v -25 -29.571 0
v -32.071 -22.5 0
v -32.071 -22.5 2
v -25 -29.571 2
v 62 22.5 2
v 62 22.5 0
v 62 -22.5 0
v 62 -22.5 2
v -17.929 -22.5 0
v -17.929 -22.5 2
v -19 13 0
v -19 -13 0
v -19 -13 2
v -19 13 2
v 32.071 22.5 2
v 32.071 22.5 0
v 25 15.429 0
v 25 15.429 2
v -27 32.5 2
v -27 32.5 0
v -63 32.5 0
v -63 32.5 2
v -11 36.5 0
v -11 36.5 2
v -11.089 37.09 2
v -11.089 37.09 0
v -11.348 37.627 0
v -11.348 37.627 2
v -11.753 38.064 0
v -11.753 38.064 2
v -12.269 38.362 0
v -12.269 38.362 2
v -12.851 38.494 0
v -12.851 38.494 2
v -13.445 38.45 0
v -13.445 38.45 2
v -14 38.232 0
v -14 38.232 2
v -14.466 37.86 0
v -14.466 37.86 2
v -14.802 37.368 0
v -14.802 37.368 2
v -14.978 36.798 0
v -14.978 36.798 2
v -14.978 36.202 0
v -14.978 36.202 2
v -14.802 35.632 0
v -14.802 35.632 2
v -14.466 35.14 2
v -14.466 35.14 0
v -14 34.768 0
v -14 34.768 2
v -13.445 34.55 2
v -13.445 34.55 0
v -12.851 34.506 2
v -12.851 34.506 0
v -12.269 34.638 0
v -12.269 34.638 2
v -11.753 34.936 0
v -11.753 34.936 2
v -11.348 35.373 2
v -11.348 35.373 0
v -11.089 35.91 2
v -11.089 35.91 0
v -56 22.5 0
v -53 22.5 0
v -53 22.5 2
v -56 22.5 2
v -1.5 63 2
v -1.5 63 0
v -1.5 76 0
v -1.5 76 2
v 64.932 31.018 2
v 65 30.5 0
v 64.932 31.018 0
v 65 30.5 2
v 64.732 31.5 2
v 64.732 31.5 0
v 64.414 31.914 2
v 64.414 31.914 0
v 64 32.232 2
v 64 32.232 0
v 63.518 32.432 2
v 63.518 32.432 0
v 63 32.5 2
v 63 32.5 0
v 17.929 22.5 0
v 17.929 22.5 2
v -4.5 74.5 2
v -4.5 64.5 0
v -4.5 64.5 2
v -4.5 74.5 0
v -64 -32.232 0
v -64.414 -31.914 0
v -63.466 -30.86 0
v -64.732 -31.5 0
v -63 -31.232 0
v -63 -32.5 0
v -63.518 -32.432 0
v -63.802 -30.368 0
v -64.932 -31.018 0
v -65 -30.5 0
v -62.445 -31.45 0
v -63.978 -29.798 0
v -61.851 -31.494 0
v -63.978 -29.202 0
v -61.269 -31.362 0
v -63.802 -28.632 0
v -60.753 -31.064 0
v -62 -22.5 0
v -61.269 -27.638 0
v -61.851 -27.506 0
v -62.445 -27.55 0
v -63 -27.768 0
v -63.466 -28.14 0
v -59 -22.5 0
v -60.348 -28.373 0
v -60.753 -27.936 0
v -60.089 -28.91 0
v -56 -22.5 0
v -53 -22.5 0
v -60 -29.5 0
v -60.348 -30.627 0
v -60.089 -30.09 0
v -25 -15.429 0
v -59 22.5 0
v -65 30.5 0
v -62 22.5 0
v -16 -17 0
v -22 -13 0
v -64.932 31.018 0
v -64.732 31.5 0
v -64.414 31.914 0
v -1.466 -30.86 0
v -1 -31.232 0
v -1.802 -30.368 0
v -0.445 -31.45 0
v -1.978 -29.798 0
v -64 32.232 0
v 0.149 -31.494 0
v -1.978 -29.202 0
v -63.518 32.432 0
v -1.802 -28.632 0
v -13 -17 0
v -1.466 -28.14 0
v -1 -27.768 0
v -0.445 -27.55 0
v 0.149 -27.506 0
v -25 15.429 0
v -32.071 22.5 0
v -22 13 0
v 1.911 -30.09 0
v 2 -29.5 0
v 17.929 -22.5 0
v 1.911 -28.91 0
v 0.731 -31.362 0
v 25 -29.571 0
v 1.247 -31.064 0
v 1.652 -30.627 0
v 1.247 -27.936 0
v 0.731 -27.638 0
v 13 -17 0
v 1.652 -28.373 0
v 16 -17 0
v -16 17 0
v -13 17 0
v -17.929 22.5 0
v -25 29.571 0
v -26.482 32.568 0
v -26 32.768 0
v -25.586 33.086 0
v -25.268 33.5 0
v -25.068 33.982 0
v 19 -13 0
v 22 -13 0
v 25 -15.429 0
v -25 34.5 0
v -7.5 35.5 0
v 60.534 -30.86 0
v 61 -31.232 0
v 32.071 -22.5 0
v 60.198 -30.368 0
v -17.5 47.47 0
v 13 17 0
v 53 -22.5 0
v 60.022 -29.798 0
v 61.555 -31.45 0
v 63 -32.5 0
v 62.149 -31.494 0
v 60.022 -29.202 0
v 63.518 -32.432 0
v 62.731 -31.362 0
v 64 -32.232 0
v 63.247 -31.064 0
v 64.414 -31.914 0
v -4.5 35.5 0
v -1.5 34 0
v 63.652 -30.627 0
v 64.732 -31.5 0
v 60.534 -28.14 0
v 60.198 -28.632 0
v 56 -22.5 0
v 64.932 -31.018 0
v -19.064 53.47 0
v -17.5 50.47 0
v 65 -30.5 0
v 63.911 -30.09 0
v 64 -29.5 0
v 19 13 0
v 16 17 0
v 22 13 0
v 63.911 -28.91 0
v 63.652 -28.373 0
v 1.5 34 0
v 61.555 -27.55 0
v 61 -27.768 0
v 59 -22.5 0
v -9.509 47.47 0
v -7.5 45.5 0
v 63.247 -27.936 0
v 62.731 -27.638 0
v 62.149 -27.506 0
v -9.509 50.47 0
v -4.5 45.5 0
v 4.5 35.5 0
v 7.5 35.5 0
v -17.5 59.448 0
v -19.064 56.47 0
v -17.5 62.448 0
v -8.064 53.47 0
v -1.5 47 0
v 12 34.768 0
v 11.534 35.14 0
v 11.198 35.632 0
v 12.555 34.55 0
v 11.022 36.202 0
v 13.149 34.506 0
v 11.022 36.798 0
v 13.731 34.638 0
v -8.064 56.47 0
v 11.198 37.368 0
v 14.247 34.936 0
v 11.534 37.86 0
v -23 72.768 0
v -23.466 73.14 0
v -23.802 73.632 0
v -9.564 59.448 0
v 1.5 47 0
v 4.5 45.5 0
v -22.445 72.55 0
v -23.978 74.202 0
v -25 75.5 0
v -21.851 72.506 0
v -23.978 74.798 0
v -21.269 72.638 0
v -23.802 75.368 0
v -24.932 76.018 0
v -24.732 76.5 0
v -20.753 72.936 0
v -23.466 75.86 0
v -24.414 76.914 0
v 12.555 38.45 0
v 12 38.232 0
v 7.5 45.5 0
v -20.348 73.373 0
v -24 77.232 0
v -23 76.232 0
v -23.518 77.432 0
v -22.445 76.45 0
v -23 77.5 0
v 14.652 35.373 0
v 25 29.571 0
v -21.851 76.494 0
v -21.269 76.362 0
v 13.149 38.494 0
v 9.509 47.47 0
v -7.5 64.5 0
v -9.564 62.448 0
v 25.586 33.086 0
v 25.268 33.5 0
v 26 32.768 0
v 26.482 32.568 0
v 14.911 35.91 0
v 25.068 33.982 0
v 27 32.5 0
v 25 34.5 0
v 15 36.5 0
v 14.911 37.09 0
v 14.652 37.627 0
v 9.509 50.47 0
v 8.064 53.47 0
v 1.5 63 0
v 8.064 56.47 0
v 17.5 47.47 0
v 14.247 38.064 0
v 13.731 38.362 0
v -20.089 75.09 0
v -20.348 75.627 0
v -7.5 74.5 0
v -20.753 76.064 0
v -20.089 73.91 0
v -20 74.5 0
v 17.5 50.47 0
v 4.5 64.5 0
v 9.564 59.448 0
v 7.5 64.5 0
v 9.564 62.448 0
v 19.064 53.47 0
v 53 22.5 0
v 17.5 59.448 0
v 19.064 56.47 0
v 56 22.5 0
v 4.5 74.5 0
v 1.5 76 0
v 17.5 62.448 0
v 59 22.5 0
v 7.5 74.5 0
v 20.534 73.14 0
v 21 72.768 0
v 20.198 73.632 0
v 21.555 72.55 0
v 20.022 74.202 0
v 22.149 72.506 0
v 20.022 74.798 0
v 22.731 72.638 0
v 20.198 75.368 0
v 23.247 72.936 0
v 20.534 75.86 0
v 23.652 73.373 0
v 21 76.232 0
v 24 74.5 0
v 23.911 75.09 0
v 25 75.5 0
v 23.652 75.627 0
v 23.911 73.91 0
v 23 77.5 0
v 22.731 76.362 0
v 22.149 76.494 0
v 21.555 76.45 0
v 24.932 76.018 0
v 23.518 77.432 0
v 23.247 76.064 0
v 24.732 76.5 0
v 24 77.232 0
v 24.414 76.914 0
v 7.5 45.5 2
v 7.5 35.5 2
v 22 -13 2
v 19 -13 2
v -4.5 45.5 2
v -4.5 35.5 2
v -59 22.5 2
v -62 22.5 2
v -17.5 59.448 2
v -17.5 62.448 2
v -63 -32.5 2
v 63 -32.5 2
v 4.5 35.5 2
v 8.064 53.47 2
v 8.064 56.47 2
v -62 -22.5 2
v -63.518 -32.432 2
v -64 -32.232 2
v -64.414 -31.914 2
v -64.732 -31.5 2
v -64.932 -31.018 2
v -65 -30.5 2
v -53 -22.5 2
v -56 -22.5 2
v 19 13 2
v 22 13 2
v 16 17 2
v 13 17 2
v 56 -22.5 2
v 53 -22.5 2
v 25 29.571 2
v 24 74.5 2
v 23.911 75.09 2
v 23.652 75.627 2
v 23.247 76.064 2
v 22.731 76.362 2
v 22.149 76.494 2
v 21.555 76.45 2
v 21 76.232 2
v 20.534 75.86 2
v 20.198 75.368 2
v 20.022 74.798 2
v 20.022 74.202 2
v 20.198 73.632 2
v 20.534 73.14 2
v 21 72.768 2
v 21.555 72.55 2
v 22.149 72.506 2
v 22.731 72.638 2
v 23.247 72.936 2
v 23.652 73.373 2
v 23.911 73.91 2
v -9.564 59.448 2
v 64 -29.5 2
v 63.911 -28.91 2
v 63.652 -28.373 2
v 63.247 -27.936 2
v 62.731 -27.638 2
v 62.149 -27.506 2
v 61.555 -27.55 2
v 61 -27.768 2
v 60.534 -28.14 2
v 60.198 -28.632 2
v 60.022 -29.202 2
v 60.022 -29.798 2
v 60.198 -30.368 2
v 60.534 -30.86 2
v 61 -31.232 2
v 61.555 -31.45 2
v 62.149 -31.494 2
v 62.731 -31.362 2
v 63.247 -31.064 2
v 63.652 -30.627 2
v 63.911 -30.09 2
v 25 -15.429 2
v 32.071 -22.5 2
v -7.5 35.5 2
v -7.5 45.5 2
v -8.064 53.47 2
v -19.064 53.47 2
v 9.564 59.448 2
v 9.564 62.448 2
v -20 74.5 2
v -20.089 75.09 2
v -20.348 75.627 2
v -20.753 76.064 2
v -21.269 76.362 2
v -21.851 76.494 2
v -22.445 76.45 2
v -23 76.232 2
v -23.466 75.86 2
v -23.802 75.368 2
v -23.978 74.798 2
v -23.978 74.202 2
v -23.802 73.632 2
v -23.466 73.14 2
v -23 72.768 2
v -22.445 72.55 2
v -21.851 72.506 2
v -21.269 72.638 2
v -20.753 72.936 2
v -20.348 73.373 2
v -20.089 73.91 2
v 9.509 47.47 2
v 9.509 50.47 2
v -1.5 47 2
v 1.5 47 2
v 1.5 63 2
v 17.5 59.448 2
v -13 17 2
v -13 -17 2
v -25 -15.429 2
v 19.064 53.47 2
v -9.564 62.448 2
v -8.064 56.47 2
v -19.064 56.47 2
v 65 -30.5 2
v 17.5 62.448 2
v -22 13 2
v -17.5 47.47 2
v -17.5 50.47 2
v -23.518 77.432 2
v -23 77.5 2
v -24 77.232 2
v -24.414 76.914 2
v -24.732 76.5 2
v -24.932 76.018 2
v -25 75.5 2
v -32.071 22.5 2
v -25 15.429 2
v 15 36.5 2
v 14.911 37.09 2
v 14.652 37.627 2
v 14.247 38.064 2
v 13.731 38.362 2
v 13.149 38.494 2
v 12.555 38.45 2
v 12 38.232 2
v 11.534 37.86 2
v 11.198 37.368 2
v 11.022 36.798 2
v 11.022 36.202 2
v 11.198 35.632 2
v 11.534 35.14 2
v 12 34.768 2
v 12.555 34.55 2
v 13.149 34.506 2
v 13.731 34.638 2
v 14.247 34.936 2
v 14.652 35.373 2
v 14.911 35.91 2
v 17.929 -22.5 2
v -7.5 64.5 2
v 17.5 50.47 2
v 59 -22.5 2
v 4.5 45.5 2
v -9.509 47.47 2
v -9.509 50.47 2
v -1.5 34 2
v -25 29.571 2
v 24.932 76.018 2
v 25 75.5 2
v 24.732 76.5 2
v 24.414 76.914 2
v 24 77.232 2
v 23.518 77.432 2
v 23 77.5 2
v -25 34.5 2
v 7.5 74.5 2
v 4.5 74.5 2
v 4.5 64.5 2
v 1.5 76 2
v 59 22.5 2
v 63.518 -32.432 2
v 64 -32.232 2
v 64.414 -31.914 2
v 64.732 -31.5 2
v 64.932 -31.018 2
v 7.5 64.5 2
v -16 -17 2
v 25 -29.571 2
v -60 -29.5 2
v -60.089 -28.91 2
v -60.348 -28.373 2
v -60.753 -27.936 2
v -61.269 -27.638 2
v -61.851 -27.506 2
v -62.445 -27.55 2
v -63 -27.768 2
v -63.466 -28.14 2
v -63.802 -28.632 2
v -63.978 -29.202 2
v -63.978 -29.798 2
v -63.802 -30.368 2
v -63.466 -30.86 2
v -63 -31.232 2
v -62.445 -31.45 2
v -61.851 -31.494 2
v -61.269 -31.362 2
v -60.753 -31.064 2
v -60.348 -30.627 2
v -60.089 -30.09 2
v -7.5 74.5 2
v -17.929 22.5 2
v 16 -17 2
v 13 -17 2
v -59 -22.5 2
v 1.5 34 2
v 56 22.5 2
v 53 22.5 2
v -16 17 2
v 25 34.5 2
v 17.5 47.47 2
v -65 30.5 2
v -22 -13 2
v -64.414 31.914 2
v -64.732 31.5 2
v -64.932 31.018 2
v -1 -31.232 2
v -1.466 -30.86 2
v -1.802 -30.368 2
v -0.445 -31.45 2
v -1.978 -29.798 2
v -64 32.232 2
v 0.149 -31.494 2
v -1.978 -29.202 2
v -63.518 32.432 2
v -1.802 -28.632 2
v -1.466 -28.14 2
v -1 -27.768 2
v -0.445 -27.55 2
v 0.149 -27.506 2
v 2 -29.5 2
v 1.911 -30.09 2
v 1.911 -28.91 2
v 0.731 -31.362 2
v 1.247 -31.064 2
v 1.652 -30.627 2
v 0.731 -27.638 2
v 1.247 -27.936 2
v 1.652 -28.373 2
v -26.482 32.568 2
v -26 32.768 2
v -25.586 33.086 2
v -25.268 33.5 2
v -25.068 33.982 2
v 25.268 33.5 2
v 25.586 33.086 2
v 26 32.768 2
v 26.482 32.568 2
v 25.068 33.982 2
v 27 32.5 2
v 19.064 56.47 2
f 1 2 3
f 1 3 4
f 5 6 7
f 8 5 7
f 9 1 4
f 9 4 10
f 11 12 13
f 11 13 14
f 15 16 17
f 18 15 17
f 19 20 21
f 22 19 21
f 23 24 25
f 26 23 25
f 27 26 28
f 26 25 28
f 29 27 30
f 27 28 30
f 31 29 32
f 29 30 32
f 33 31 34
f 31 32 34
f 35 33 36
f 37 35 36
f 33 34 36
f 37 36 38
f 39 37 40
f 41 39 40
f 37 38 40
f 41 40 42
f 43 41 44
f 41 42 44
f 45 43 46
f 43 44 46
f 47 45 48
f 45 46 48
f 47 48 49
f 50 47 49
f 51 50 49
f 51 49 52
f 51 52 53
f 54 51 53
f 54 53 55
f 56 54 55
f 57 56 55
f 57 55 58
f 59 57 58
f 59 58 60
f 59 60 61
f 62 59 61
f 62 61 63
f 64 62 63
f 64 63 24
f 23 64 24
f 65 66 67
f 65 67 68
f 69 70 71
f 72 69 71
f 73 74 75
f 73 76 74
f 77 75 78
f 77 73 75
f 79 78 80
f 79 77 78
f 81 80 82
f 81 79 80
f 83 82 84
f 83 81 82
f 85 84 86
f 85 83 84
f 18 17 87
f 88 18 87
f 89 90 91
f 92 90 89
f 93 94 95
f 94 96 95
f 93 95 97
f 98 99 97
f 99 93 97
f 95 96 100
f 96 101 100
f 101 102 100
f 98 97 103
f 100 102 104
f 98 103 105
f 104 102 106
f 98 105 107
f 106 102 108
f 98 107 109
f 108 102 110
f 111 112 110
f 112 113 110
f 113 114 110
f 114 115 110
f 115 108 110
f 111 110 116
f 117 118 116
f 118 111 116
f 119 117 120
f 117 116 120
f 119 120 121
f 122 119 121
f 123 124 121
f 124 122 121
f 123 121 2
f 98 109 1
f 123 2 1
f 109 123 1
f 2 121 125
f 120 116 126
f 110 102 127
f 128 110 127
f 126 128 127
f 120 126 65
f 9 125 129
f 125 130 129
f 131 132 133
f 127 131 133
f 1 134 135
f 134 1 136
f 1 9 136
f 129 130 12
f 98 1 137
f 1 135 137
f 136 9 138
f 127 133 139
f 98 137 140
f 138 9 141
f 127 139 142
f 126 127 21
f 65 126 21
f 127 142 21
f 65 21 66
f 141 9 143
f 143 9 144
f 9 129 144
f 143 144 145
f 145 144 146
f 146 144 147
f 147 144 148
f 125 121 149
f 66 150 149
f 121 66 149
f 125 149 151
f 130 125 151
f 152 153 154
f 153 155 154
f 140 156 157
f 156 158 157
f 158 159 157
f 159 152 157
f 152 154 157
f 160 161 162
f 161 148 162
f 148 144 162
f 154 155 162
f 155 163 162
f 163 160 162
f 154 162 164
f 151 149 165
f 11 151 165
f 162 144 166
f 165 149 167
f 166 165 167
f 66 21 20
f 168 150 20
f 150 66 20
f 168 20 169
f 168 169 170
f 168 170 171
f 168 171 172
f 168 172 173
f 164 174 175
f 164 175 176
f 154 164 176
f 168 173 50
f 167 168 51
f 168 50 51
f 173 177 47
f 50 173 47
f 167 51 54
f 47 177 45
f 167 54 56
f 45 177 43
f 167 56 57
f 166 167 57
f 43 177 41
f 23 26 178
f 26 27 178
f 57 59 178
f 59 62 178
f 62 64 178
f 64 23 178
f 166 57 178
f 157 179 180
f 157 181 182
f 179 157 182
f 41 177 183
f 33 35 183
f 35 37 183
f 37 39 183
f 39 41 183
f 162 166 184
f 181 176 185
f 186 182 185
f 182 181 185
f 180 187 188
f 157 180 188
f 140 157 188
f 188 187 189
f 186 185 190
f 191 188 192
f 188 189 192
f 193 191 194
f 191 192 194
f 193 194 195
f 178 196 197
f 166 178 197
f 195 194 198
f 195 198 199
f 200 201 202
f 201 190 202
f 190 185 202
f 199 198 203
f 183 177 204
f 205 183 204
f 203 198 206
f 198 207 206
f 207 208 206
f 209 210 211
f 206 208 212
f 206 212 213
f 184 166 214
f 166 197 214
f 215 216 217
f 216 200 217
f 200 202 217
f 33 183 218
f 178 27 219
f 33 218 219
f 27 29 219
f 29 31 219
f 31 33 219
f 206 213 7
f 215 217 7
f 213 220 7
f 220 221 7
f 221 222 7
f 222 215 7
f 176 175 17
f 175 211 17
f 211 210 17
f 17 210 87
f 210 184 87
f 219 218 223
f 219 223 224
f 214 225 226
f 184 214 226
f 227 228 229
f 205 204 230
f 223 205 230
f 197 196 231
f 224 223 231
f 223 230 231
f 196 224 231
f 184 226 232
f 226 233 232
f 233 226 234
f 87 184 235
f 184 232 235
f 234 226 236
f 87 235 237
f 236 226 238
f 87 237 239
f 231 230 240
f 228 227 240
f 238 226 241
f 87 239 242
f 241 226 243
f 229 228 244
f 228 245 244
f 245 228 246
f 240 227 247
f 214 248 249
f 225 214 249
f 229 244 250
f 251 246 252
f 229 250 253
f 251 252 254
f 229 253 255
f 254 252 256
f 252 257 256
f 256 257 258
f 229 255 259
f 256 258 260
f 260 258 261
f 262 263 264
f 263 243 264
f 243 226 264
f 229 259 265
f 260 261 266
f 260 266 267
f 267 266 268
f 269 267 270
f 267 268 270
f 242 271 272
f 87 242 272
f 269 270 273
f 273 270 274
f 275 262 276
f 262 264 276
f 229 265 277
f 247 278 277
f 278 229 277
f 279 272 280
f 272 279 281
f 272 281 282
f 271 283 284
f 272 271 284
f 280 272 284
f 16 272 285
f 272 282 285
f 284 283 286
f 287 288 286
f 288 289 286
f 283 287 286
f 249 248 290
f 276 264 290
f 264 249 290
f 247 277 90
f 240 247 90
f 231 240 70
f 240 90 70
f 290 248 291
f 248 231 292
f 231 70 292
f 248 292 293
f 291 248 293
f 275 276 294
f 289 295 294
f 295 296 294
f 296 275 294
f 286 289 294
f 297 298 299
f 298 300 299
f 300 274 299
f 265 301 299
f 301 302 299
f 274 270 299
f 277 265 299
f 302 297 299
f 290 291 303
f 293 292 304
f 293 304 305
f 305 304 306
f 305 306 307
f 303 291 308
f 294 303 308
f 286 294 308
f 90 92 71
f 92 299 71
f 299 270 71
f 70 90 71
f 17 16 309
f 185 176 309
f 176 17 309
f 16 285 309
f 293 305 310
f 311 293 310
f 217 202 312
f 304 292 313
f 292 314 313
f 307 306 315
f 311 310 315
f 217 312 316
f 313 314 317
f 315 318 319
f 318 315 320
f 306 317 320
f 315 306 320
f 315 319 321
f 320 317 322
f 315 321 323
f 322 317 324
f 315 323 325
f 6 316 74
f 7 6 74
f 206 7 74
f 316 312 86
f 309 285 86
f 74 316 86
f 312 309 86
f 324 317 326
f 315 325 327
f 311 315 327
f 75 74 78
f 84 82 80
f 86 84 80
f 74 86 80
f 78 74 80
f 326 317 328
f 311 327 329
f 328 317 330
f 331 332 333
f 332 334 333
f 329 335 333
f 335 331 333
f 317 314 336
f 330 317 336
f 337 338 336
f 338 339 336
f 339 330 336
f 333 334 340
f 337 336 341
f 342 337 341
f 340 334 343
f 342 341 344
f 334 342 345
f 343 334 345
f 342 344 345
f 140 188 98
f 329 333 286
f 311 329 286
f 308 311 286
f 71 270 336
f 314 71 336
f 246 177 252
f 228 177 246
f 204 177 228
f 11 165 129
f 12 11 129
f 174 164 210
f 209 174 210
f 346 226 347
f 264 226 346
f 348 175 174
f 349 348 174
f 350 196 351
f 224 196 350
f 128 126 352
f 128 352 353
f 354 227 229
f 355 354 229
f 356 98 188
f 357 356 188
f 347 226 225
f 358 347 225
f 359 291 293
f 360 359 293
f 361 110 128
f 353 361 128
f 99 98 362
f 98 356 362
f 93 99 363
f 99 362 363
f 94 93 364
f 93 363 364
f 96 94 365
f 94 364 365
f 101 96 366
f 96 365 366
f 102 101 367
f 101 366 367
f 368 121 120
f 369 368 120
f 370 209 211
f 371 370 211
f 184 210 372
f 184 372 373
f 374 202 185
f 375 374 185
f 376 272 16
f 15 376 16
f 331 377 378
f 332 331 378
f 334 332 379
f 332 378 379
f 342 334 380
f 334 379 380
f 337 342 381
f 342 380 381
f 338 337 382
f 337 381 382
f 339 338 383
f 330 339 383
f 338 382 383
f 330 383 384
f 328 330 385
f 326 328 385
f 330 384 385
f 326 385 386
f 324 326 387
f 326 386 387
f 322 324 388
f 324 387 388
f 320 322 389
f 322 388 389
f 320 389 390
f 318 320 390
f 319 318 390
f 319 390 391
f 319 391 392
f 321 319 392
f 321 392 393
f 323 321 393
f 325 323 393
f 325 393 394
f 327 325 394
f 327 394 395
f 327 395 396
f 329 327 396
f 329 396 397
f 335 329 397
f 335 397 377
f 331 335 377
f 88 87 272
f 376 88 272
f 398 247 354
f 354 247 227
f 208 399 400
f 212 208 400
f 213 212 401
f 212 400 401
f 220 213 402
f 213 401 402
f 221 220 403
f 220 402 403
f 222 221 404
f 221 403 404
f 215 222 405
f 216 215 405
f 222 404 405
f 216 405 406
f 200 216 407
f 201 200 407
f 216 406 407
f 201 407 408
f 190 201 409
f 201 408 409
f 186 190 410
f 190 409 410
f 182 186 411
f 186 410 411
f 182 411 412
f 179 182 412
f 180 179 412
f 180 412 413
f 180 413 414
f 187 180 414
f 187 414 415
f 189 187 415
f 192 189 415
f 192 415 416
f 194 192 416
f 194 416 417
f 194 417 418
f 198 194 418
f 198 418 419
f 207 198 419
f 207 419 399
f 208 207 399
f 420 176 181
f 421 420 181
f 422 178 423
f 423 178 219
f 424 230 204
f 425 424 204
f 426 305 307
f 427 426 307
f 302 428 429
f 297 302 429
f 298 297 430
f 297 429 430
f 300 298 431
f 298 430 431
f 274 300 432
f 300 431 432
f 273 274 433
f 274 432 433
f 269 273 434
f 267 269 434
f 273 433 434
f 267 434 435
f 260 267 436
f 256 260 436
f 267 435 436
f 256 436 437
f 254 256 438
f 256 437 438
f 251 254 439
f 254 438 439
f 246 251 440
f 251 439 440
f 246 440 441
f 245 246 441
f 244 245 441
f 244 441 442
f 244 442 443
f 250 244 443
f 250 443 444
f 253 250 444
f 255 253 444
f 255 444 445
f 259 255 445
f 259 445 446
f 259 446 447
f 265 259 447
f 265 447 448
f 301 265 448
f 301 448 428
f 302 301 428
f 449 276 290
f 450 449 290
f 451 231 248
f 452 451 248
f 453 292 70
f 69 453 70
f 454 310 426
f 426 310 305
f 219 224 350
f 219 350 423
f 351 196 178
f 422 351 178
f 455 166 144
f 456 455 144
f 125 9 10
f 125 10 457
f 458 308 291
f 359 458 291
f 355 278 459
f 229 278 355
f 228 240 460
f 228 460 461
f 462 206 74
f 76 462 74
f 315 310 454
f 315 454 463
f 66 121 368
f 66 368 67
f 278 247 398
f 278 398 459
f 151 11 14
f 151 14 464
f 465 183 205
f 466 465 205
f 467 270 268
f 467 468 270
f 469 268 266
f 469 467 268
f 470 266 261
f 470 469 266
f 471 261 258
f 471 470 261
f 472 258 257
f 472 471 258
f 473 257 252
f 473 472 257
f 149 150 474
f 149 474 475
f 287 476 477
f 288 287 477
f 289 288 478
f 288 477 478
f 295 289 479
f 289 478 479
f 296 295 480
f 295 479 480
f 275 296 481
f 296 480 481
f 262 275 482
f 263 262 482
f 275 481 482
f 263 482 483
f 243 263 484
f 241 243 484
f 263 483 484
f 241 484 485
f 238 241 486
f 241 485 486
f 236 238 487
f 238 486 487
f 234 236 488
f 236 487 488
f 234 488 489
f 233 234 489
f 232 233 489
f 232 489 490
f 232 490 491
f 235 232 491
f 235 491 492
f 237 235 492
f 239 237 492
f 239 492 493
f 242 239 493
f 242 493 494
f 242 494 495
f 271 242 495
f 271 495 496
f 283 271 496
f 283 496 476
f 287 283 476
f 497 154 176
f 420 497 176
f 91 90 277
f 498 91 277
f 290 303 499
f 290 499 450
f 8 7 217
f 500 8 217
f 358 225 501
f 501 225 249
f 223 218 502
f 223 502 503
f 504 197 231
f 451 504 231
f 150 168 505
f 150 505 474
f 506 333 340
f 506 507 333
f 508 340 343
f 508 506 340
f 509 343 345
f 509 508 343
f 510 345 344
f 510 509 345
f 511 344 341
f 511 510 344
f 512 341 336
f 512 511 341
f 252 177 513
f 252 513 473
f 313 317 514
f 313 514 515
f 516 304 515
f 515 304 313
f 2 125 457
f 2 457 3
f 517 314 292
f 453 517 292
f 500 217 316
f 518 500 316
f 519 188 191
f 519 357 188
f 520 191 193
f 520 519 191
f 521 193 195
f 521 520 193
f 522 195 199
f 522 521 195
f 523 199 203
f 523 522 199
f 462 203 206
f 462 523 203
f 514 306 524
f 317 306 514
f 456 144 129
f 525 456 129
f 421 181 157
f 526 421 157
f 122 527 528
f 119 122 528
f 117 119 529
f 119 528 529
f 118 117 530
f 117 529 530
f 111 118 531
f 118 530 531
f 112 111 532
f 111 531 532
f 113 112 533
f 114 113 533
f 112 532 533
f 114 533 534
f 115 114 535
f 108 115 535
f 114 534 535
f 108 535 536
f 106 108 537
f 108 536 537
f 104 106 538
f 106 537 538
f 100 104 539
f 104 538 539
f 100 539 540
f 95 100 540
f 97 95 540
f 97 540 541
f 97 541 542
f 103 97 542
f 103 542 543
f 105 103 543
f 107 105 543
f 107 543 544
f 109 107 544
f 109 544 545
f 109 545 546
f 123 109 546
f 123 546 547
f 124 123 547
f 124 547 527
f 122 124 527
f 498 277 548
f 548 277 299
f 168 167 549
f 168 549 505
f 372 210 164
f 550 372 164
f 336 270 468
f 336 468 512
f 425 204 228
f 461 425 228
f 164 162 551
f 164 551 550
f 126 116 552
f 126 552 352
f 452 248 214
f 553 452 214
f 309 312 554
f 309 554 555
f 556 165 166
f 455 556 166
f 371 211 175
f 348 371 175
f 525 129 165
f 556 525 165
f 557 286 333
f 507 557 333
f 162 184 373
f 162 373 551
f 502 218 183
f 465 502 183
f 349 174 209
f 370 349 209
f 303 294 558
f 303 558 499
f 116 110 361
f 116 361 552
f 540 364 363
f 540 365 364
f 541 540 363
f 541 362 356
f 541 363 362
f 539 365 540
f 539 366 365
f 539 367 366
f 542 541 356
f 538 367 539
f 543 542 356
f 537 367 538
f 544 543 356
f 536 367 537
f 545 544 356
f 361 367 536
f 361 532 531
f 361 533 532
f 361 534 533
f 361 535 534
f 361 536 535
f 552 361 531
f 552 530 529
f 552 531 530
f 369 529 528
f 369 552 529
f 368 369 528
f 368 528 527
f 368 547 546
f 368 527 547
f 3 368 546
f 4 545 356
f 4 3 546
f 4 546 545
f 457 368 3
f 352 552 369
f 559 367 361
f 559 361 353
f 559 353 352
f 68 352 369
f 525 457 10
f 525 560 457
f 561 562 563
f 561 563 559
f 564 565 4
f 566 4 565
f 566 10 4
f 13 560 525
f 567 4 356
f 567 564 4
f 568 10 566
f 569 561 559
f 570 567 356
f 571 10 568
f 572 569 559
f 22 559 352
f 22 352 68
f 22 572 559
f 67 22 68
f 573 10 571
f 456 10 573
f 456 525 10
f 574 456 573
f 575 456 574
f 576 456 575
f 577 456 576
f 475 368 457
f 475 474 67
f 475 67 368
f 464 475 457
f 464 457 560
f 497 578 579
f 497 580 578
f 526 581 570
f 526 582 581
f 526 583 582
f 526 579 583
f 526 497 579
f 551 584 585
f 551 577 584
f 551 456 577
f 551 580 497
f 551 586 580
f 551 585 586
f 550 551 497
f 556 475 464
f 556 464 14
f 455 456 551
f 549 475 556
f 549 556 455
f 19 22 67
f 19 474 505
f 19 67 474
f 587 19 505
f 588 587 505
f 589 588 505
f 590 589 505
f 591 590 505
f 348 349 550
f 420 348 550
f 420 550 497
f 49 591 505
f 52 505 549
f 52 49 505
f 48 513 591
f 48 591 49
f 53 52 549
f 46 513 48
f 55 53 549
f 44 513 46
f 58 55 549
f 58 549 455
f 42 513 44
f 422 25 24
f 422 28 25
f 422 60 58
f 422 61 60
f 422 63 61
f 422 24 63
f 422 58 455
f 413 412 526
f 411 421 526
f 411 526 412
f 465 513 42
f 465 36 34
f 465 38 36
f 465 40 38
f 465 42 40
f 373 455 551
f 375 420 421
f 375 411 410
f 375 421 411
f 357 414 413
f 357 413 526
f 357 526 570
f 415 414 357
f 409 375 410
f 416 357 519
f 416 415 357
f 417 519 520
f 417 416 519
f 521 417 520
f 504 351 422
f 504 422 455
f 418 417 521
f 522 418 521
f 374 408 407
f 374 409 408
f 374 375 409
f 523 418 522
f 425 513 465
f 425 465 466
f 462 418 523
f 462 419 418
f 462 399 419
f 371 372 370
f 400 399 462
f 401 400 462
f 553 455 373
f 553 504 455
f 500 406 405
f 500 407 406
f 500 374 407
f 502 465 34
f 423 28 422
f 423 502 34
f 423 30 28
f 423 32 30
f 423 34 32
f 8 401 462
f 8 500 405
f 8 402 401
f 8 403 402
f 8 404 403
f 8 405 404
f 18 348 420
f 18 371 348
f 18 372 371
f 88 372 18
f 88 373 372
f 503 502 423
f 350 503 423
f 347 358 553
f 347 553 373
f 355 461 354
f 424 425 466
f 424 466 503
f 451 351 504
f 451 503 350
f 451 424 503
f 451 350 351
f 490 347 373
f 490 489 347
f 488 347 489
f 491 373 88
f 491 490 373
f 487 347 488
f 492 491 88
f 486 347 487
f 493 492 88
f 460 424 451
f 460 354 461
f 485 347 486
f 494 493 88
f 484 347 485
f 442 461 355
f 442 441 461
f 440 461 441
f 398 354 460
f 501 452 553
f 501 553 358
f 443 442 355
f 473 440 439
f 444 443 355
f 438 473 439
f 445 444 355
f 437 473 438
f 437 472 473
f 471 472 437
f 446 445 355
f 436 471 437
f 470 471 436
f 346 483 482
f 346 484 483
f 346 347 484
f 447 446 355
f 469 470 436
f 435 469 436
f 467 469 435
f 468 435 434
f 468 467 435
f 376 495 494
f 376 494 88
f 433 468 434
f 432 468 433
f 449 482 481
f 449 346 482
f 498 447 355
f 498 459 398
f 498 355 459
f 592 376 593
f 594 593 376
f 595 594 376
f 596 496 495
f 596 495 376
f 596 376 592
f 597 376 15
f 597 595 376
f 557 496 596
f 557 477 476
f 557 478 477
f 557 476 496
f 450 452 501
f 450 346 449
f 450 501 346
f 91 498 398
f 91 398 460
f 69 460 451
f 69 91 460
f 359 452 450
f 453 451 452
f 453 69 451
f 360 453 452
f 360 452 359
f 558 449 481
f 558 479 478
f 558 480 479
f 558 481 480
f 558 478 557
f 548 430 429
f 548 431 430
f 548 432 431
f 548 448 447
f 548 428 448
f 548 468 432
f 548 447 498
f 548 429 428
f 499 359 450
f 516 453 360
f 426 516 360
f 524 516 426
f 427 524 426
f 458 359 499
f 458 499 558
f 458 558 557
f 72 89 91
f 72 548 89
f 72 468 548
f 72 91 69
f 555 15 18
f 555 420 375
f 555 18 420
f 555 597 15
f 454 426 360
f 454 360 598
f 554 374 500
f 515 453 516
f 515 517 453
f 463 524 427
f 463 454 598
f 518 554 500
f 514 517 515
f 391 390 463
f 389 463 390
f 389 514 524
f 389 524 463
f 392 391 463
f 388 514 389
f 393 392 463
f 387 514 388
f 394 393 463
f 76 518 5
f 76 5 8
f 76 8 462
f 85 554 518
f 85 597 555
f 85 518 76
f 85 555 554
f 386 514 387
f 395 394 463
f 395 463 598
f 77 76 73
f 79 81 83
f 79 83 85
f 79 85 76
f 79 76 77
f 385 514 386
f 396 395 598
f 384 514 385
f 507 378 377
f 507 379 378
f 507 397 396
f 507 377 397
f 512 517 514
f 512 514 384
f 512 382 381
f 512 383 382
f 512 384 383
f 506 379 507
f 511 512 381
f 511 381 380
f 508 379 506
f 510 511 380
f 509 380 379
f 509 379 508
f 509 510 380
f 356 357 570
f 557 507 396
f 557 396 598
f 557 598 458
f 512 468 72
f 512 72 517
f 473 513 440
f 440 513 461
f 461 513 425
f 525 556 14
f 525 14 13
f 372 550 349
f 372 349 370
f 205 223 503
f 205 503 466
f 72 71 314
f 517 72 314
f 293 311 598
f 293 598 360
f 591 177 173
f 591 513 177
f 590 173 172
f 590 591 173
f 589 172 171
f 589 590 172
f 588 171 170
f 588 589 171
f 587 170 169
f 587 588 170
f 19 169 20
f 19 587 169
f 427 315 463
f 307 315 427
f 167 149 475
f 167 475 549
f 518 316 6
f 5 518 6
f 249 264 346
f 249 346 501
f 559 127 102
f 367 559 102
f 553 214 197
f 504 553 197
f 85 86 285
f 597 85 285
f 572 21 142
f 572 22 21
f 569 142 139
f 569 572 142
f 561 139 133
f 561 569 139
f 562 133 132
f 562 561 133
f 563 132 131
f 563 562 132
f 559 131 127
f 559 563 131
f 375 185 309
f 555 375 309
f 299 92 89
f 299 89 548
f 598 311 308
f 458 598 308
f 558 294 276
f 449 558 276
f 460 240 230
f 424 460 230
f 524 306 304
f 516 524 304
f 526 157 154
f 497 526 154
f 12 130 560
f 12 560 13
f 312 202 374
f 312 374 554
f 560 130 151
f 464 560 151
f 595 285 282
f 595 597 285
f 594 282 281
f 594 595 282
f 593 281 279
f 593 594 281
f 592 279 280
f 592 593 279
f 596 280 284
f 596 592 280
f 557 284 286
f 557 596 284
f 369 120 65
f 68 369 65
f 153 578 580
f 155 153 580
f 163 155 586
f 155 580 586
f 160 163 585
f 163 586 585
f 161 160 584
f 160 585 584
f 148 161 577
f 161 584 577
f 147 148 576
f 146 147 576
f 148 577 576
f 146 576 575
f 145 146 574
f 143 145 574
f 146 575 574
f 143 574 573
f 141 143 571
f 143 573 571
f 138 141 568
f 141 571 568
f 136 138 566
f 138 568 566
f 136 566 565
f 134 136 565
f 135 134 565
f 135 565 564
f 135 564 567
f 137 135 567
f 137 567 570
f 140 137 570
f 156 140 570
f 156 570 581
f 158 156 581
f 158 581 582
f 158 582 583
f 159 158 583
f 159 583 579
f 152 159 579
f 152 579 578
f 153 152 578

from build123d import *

# Parameters (mm, degrees)
SKETCH1_W           = 50
SKETCH1_H           = 45
BOSS_EXTRUDE1_DEPTH = 2
FILLET1_R           = 2
SKETCH3_W           = 3
SKETCH3_H           = 10
SKETCH3_W_2         = 7.936264089
SKETCH3_H_2         = 3
SKETCH3_W_3         = 11
SKETCH3_H_3         = 1.470363465
SKETCH3_H_4         = 1.529636535
SKETCH3_W_4         = 7.991276849
SKETCH3_H_5         = 45
CUT_EXTRUDE1_DEPTH  = 2
SKETCH4_R           = 2
CUT_EXTRUDE2_DEPTH  = 10


with BuildPart() as part:
    # Sketch1 → Boss-Extrude1 (new body)
    with BuildSketch(Plane.XY):
        Polygon((-65, -32.5), (65, -32.5), (65, 32.5), (25, 32.5), (25, -12.5), (-25, -12.5), (-25, 32.5), (-65, 32.5), align=None)
        with Locations((0, 55)):
            Rectangle(SKETCH1_W, SKETCH1_H)
        with Locations((0, 10)):
            Rectangle(SKETCH1_W, SKETCH1_H)
    extrude(amount=BOSS_EXTRUDE1_DEPTH)

    # Fillet1
    fillet1_edges = [part.edges().sort_by_distance(p)[0] for p in [
        (65, 32.5, 1),
        (65, -32.5, 1),
        (-65, -32.5, 1),
        (-65, 32.5, 1),
        (-25, 32.5, 1),
        (-25, 77.5, 1),
        (25, 77.5, 1),
        (25, 32.5, 1),
    ]]
    fillet(fillet1_edges, radius=FILLET1_R)

    # Sketch3 → Cut-Extrude1 (cut)
    with BuildSketch(Plane(origin=(0, 0, 0), x_dir=(-1, 0, 0), z_dir=(0, 0, -1))):
        with Locations((6, 40.5)):
            Rectangle(SKETCH3_W, SKETCH3_H)
        with Locations((-6, 40.5)):
            Rectangle(SKETCH3_W, SKETCH3_H)
        Polygon((-1.5, 34), (0, 34), (0, 47), (-1.5, 47), (-1.5, 45.5), (-1.5, 35.5), align=None)
        Polygon((0, 47), (0, 34), (1.5, 34), (1.5, 35.5), (1.5, 45.5), (1.5, 47), align=None)
        with Locations((-6, 69.5)):
            Rectangle(SKETCH3_W, SKETCH3_H)
        Polygon((-1.5, 63), (0, 63), (0, 76), (-1.5, 76), (-1.5, 74.5), (-1.5, 64.5), align=None)
        Polygon((0, 76), (0, 63), (1.5, 63), (1.5, 64.5), (1.5, 74.5), (1.5, 76), align=None)
        with Locations((6, 69.5)):
            Rectangle(SKETCH3_W, SKETCH3_H)
        with Locations((13.531867956, 60.94842354)):
            Rectangle(SKETCH3_W_2, SKETCH3_H_2)
        with Locations((13.563735911, 55.735181733)):
            Rectangle(SKETCH3_W_3, SKETCH3_H_3)
        with Locations((13.563735911, 54.235181733)):
            Rectangle(SKETCH3_W_3, SKETCH3_H_4)
        with Locations((13.504361575, 48.970363465)):
            Rectangle(SKETCH3_W_4, SKETCH3_H_2)
        with Locations((-13.531867956, 60.94842354)):
            Rectangle(SKETCH3_W_2, SKETCH3_H_2)
        with Locations((-13.563735911, 55.735181733)):
            Rectangle(SKETCH3_W_3, SKETCH3_H_3)
        with Locations((-13.563735911, 54.235181733)):
            Rectangle(SKETCH3_W_3, SKETCH3_H_4)
        with Locations((-13.504361575, 48.970363465)):
            Rectangle(SKETCH3_W_4, SKETCH3_H_2)
        Polygon((-25, 15.428932188), (-17.928932188, 22.5), (-25, 29.571067812), (-32.071067812, 22.5), align=None)
        Polygon((-19, -13), (-19, 13), (-22, 13), (-22, 0), (-22, -13), align=None)
        Polygon((-13, 17), (-13, -17), (-16, -17), (-16, 13), (-16, 17), align=None)
        Polygon((-25, -29.571067812), (-17.928932188, -22.5), (-25, -15.428932188), (-32.071067812, -22.5), align=None)
        with Locations((-54.5, 0)):
            Rectangle(SKETCH3_W, SKETCH3_H_5)
        Polygon((-59, -22.5), (-59, 22.5), (-62, 22.5), (-62, 0), (-62, -22.5), align=None)
        Polygon((25, 29.571067812), (32.071067812, 22.5), (25, 15.428932188), (17.928932188, 22.5), align=None)
        Polygon((22, 0), (22, -13), (19, -13), (19, 13), (22, 13), align=None)
        Polygon((13, 17), (13, -17), (16, -17), (16, 13), (16, 17), align=None)
        Polygon((25, -15.428932188), (32.071067812, -22.5), (25, -29.571067812), (17.928932188, -22.5), align=None)
        Polygon((62, 0), (62, -22.5), (59, -22.5), (59, 22.5), (62, 22.5), align=None)
        with Locations((54.5, 0)):
            Rectangle(SKETCH3_W, SKETCH3_H_5)
    extrude(amount=-CUT_EXTRUDE1_DEPTH, mode=Mode.SUBTRACT)

    # Sketch4 → Cut-Extrude2 (cut)
    with BuildSketch(Plane.XY.offset(2)):
        with Locations((0, -29.5)):
            Circle(SKETCH4_R)
        with Locations((-62, -29.5)):
            Circle(SKETCH4_R)
        with Locations((-13, 36.5)):
            Circle(SKETCH4_R)
        with Locations((13, 36.5)):
            Circle(SKETCH4_R)
        with Locations((62, -29.5)):
            Circle(SKETCH4_R)
        with Locations((22, 74.5)):
            Circle(SKETCH4_R)
        with Locations((-22, 74.5)):
            Circle(SKETCH4_R)
    extrude(amount=-CUT_EXTRUDE2_DEPTH, mode=Mode.SUBTRACT)


solid = part.part
